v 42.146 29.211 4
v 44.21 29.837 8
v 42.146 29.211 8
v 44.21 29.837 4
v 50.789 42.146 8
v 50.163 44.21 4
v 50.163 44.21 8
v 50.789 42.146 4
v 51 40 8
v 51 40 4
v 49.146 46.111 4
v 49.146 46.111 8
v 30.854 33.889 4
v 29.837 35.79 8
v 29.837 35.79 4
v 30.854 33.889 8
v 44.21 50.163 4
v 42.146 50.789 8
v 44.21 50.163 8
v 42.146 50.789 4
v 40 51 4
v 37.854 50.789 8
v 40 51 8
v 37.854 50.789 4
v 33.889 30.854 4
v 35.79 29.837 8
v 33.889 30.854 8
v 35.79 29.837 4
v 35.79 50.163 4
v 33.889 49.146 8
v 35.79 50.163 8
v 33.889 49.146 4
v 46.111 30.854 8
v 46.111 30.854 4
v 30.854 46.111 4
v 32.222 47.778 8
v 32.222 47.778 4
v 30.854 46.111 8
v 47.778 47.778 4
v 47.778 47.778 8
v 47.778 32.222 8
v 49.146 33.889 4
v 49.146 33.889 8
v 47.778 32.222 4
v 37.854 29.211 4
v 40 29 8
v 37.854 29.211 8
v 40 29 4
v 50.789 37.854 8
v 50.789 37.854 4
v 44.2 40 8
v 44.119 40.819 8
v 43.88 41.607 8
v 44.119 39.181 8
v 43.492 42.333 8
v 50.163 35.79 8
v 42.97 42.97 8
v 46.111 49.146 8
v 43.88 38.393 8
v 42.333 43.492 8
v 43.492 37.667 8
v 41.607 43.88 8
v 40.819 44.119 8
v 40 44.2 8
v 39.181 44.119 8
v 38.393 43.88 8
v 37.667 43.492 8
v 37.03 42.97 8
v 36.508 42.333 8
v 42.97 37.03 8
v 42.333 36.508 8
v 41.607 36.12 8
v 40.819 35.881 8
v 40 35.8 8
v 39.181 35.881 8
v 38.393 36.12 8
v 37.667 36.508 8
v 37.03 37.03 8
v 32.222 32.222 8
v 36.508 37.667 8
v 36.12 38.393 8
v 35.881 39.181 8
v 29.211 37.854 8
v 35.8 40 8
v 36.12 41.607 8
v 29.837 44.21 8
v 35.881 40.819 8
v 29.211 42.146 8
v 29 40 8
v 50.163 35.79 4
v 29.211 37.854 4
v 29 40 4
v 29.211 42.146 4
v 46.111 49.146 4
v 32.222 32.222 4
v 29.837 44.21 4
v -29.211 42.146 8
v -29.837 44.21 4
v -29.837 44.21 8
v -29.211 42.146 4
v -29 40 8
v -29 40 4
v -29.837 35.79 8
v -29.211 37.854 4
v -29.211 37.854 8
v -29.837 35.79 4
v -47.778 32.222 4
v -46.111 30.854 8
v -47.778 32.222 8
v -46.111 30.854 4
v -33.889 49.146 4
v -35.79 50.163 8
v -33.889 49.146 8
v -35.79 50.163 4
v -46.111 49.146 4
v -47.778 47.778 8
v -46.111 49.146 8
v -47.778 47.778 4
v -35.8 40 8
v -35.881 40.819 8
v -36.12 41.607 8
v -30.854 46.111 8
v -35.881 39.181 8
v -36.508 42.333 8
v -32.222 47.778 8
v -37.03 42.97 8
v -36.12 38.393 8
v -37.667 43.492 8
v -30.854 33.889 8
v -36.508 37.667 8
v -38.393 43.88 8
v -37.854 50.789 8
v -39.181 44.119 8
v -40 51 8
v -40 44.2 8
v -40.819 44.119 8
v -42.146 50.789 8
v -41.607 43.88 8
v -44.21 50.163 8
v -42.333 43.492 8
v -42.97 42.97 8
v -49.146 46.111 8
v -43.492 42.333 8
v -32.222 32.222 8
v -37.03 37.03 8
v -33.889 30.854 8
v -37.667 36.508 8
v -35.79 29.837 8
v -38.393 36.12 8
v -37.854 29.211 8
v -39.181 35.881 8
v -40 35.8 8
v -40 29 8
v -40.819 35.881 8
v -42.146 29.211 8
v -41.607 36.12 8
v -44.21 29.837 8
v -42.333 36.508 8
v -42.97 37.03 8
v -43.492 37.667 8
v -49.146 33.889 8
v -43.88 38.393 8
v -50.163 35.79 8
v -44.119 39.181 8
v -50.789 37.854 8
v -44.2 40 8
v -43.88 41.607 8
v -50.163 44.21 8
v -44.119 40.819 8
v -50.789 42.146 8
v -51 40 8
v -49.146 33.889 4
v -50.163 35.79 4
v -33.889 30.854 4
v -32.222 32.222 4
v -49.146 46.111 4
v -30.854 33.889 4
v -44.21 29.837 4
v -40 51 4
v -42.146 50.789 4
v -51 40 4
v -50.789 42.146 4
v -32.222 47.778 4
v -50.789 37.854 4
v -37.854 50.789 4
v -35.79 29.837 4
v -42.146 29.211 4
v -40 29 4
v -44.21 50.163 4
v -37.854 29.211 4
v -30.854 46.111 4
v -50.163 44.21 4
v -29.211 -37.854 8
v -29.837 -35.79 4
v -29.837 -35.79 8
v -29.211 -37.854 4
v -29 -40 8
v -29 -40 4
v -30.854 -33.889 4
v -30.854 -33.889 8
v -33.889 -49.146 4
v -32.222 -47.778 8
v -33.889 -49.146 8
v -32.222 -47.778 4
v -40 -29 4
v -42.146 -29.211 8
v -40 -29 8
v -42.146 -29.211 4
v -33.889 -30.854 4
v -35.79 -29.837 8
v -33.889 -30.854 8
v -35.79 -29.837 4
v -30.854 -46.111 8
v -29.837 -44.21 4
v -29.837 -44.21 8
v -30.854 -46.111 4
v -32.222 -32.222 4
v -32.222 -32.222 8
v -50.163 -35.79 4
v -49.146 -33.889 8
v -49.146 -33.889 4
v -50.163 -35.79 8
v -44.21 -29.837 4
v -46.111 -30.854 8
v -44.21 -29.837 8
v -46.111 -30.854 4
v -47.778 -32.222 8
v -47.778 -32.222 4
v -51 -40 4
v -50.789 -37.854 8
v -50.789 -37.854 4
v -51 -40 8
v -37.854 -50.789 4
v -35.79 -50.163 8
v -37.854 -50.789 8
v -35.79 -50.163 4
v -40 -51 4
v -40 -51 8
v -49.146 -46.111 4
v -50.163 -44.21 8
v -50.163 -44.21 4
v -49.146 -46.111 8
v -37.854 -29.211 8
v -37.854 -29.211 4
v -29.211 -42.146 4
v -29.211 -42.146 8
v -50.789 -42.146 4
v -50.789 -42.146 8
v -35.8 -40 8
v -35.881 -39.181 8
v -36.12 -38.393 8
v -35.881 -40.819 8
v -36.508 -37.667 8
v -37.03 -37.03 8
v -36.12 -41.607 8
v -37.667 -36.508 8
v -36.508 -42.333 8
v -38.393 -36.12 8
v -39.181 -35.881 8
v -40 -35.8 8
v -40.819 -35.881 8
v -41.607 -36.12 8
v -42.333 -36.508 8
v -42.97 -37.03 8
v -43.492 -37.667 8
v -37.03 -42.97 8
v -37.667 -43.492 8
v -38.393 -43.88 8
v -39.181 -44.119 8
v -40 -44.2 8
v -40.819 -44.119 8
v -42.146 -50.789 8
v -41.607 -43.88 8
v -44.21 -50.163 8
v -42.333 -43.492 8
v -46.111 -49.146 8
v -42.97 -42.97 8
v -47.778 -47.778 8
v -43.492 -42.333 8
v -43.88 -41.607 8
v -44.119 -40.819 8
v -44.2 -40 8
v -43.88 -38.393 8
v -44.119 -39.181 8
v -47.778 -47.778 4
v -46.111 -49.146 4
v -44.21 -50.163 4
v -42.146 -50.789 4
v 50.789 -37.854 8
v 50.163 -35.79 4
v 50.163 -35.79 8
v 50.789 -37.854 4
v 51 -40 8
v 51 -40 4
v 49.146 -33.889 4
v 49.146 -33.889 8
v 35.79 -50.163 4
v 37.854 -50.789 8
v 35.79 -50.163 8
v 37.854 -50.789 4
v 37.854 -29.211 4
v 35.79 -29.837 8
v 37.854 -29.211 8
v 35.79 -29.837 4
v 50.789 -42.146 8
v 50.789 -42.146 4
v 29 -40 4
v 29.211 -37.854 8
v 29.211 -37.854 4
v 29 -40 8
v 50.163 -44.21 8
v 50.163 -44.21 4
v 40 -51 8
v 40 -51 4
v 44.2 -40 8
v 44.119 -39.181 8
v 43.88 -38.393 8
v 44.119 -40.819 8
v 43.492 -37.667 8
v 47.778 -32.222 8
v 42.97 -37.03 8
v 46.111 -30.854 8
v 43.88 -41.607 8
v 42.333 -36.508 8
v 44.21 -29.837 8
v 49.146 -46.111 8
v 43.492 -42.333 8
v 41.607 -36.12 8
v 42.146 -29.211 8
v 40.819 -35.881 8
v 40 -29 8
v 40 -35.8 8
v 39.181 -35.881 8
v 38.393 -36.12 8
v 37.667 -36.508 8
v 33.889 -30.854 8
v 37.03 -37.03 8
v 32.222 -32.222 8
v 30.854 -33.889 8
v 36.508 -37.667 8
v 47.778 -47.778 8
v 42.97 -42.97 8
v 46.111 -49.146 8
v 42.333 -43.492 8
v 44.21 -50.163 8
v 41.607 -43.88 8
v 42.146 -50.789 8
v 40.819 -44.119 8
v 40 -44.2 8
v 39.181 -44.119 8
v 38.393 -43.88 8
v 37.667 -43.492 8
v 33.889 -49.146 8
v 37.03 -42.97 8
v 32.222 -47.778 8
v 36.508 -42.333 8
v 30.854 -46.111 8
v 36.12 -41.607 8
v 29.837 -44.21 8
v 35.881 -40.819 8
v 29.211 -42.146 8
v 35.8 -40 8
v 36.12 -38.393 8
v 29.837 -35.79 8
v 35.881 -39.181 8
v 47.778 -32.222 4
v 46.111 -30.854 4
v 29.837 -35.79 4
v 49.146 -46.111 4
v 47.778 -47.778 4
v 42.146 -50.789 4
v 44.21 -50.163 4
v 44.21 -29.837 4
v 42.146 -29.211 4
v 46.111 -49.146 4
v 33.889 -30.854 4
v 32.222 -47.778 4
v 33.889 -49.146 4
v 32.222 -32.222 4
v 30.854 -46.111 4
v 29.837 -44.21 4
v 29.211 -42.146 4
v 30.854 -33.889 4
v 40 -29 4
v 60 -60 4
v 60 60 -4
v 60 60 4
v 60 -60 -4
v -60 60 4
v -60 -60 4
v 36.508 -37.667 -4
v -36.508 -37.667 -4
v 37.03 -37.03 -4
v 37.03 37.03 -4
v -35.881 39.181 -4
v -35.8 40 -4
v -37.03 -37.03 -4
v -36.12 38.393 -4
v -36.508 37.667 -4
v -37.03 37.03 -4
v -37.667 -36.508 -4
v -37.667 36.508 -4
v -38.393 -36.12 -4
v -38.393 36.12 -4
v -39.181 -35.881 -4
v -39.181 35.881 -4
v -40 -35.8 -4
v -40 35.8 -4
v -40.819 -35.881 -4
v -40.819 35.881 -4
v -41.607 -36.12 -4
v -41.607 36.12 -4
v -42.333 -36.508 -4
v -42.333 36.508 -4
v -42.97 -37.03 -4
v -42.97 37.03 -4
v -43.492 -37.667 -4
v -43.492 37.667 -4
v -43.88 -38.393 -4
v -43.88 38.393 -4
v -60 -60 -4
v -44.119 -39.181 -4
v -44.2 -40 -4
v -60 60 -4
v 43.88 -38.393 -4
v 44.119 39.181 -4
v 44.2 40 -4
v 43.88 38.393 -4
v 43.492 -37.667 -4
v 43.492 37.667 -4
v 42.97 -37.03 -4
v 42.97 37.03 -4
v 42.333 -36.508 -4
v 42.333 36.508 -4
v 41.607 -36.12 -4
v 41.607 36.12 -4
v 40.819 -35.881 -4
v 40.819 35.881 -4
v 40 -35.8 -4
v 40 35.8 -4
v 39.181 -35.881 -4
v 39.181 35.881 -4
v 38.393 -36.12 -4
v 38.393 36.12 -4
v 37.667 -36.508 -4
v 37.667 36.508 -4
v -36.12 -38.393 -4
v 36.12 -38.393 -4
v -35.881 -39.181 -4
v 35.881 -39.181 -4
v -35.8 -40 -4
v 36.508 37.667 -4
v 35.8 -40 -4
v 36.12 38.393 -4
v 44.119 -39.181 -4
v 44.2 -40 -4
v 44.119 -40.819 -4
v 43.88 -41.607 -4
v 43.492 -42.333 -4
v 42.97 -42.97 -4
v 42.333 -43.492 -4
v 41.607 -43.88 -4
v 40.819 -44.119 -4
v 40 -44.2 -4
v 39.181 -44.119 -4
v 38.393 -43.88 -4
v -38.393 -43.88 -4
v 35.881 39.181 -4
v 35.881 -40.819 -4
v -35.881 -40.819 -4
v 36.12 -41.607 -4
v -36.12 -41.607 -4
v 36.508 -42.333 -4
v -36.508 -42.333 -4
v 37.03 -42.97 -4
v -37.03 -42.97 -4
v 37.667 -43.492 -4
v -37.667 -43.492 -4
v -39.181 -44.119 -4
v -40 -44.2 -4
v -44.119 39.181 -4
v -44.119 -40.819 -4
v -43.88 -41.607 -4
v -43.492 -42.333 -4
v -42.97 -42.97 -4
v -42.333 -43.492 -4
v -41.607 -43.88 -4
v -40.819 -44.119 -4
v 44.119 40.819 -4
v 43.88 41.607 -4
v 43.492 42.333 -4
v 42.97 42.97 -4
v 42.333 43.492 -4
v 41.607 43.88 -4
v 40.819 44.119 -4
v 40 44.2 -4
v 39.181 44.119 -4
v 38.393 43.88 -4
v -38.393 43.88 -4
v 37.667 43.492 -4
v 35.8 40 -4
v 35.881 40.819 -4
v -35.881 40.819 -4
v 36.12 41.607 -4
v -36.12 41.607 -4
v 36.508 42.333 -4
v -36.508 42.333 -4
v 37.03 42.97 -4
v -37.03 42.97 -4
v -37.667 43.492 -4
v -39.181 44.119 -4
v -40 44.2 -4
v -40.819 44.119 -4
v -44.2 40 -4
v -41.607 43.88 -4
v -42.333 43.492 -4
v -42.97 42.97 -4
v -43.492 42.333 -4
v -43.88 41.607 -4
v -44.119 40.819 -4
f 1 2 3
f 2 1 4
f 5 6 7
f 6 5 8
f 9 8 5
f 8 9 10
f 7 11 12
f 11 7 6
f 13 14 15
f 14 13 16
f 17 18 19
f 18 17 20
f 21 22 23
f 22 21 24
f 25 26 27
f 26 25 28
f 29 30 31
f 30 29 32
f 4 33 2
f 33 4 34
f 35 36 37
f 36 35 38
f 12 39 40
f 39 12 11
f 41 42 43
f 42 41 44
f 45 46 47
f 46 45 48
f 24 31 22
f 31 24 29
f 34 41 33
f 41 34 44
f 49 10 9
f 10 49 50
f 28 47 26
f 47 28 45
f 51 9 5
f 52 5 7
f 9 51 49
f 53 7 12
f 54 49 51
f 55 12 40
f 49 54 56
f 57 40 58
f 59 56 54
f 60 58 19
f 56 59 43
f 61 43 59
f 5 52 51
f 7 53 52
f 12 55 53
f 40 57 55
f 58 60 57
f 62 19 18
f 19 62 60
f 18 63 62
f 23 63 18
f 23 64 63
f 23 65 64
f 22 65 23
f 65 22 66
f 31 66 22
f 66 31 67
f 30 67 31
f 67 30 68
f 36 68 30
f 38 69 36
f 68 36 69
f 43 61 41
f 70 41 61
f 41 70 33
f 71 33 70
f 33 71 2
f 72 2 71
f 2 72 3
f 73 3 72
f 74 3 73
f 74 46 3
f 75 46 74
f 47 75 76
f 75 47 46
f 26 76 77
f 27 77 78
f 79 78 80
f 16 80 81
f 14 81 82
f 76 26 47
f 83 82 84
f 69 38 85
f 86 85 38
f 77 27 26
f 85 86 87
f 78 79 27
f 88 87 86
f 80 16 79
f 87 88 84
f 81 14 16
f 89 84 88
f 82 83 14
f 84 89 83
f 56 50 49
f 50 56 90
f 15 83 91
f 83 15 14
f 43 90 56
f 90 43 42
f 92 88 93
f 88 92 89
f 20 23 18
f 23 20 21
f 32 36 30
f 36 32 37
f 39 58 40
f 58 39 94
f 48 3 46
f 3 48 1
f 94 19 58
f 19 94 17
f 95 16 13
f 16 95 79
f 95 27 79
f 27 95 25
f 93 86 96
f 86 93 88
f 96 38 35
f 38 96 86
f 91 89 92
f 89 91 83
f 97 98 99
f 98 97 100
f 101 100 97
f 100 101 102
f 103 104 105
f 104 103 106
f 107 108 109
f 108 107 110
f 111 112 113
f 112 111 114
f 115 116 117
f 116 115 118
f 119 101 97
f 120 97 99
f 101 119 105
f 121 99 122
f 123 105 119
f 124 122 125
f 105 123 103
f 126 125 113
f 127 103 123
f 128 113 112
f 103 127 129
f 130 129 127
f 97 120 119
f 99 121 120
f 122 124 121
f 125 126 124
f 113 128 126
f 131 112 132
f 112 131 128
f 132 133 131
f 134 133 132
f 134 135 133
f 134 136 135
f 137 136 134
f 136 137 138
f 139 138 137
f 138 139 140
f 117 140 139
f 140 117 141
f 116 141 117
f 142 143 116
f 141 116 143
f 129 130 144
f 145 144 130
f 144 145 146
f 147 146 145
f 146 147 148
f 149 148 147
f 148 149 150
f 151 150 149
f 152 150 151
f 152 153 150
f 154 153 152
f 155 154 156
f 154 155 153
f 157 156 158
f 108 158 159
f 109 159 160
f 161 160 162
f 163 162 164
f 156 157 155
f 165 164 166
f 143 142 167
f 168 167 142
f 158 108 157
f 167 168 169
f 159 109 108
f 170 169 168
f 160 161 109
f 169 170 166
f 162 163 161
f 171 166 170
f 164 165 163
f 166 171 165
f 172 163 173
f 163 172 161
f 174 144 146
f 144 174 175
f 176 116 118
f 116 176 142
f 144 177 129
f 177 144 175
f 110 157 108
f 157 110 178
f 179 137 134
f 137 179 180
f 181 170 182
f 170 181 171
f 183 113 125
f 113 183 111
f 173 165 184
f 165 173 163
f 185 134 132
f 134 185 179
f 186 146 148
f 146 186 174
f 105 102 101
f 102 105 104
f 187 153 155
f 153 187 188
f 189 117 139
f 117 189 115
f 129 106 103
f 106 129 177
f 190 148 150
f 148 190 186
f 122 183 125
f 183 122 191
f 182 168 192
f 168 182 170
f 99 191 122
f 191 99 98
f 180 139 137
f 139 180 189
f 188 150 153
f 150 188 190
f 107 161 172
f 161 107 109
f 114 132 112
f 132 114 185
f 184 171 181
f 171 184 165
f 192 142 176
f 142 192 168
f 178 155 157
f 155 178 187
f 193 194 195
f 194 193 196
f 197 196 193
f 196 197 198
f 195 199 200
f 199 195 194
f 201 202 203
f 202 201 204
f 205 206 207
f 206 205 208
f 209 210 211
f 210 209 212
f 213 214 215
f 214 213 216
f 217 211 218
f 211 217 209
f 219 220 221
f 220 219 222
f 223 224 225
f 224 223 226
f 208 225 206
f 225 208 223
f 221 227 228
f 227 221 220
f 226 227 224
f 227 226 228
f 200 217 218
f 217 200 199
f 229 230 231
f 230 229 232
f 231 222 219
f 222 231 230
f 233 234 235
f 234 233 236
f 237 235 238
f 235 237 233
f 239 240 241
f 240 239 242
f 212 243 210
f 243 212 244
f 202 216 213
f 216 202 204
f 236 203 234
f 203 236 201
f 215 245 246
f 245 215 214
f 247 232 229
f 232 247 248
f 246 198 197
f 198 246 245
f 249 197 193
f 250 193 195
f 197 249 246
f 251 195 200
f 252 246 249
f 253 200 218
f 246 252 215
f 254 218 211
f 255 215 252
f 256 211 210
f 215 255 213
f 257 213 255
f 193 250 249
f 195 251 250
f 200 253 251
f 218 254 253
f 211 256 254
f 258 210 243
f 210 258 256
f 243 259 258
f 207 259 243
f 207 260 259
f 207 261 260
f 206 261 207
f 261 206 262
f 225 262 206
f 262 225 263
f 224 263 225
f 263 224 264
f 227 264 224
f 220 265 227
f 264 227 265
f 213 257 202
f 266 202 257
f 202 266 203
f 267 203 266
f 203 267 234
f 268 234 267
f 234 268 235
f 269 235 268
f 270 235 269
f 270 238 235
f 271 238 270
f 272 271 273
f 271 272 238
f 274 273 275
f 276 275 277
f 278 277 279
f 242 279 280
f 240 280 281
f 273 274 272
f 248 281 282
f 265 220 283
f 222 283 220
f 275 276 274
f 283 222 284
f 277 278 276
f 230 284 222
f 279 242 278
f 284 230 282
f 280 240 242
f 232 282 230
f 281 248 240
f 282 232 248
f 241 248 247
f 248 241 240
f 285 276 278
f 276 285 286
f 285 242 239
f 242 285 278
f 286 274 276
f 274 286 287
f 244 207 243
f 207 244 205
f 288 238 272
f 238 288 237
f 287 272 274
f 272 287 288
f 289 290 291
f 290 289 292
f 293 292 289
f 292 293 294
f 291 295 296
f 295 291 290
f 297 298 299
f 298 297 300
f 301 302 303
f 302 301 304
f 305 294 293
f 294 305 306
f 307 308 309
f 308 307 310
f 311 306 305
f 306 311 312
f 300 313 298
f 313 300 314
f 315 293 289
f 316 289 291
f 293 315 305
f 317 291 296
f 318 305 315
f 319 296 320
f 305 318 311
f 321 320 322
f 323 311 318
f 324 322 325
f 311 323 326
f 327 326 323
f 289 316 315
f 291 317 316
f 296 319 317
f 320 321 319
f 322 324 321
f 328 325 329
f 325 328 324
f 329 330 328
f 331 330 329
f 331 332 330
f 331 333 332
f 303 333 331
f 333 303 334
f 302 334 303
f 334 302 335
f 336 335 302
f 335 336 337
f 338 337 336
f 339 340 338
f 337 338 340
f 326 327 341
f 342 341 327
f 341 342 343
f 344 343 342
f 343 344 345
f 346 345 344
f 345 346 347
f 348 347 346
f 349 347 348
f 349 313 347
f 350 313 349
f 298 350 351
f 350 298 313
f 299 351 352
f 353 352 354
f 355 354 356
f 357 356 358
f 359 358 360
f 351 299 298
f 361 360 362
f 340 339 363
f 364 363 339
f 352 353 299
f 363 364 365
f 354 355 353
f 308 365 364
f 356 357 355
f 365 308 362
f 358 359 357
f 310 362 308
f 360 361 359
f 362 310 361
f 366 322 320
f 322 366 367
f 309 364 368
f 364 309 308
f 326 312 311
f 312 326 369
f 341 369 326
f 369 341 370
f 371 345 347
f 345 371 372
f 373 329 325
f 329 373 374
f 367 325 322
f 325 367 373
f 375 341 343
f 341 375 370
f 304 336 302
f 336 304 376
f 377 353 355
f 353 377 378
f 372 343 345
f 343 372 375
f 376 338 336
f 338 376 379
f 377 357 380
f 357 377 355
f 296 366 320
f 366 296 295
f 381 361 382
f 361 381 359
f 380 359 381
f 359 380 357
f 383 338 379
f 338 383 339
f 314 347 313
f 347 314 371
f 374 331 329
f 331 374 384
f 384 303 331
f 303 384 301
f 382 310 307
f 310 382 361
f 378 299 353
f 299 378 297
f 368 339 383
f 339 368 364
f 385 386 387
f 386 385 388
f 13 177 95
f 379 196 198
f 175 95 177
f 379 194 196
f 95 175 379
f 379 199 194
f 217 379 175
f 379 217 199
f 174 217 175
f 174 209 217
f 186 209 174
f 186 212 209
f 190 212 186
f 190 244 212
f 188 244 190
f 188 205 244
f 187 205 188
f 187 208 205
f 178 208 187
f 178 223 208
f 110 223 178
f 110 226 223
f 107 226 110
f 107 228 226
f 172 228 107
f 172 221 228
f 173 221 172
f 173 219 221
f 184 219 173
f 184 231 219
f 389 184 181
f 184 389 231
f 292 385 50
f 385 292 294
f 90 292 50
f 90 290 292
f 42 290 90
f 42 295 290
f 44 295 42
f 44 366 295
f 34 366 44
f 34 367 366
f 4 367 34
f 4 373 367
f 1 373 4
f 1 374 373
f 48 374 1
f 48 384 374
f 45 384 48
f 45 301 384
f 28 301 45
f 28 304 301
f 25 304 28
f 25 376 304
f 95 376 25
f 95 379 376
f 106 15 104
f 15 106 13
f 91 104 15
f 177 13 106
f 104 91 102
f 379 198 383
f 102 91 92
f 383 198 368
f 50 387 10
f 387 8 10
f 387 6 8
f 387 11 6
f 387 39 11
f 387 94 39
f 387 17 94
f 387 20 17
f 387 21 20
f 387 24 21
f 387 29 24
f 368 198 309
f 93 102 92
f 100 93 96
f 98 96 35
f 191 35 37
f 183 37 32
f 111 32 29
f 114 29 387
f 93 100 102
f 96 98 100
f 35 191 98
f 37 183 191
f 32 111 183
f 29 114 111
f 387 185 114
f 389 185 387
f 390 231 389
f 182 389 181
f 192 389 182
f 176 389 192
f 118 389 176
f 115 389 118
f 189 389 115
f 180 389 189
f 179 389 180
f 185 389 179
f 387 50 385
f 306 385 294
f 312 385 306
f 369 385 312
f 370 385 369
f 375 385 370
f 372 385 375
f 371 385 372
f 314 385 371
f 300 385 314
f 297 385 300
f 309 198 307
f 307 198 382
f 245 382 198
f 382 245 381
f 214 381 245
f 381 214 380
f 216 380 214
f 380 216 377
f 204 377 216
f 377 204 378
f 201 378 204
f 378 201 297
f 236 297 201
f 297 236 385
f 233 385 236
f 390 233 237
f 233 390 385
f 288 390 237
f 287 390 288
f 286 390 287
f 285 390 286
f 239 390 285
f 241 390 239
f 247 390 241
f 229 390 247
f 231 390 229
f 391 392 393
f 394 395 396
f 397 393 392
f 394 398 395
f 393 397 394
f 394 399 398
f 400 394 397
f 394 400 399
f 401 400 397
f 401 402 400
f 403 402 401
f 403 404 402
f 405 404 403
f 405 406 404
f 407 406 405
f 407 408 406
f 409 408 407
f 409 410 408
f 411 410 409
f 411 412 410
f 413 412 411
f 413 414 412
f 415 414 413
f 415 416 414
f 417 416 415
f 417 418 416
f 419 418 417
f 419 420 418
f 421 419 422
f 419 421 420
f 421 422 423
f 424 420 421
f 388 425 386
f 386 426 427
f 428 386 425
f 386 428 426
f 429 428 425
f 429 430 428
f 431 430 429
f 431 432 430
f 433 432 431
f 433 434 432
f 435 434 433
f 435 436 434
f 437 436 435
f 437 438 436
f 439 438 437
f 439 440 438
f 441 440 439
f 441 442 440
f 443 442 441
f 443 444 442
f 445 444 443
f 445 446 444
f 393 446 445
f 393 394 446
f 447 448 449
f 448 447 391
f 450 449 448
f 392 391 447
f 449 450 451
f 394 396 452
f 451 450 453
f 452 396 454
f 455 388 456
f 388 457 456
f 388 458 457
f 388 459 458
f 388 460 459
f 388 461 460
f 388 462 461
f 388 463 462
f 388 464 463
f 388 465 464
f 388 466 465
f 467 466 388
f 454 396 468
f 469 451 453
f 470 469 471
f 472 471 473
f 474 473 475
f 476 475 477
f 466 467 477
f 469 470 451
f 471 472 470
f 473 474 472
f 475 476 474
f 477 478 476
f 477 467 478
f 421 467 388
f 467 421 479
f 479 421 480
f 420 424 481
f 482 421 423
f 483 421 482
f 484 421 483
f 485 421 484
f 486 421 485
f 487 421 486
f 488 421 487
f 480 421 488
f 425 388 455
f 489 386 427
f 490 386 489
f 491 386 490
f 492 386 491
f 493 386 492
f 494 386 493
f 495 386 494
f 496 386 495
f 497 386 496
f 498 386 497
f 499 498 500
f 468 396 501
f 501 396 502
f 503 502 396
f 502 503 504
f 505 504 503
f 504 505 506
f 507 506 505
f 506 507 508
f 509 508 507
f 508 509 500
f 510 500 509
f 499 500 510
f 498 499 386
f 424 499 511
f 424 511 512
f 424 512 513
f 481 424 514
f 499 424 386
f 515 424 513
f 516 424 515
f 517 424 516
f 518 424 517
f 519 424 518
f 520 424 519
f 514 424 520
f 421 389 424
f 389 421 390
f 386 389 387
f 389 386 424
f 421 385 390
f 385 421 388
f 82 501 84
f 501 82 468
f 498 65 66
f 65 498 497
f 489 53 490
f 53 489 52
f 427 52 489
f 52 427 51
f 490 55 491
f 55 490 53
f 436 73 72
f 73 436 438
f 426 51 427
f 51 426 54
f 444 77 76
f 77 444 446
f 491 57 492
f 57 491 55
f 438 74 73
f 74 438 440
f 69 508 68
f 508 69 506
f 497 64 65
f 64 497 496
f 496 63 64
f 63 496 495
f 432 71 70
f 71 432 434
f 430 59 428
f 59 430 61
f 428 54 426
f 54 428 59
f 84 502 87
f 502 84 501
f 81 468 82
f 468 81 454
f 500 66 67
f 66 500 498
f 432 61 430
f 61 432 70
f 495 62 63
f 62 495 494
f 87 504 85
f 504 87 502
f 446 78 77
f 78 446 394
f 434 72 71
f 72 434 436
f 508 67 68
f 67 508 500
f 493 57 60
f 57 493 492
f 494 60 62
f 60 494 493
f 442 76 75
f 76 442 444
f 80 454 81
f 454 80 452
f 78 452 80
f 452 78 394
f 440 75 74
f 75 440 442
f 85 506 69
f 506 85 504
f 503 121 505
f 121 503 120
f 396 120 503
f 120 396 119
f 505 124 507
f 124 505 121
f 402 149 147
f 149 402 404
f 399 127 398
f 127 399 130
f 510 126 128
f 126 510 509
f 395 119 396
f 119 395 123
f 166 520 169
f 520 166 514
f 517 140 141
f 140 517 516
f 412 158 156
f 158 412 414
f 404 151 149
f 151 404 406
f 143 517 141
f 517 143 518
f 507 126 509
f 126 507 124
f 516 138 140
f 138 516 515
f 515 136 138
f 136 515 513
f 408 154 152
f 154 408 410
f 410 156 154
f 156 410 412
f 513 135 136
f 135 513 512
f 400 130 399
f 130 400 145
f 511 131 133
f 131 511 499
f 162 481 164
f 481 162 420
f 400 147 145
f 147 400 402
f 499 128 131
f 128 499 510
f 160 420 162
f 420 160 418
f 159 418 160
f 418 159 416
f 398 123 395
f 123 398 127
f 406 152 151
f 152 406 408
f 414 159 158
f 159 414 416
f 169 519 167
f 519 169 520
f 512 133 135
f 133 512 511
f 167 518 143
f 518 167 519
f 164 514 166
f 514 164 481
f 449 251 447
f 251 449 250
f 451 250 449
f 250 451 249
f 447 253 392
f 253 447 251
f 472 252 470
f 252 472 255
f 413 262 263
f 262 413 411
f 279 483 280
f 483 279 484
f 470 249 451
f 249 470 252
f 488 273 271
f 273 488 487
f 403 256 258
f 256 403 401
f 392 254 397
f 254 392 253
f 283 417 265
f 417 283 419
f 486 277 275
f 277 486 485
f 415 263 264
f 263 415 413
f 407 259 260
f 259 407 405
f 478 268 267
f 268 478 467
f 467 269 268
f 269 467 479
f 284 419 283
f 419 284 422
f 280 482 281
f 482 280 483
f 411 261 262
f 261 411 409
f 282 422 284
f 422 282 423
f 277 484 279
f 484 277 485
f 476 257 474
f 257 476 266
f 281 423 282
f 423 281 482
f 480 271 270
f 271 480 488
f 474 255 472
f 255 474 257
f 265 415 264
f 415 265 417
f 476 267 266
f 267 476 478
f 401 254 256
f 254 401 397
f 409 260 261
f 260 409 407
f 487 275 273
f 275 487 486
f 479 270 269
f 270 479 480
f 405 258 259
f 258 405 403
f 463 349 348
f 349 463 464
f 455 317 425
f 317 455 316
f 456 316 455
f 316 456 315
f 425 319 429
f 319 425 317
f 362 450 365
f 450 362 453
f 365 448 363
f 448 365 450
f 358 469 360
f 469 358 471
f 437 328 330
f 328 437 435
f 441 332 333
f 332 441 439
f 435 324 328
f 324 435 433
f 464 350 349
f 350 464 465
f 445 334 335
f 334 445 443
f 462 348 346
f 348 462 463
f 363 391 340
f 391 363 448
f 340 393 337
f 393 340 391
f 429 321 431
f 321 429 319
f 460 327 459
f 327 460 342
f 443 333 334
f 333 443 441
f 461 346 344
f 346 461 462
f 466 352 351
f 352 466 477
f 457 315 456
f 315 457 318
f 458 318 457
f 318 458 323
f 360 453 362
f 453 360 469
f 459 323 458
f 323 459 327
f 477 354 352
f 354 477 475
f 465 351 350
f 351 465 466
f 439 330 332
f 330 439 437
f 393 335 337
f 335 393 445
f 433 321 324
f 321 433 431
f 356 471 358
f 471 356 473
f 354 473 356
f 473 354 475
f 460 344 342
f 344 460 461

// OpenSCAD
$fn = 32;

// ----------------------------------------------------------------------
// Anchor pads 120 x 120 x 12
// four corner bosses with anchor holes
// ----------------------------------------------------------------------

// --- parameters (mm) ---
plate = [120, 120, 8];  // base plate size (x, y, z)
pads = 4;               // boss count, one per corner
edge = 20;              // boss centre offset from the plate edge
boss_d = 22;            // boss diameter
boss_h = 4;             // boss height above the base plate
hole_d = 8.4;           // hole diameter

// --- derived feature positions (mm) ---
height = plate[2] + boss_h;      // = 12   overall height of the part
corner_x = plate[0] / 2 - edge;  // = 40   boss centre X
corner_y = plate[1] / 2 - edge;  // = 40   boss centre Y
feature_centers = [
  [corner_x, corner_y],
  [-corner_x, corner_y],
  [-corner_x, -corner_y],
  [corner_x, -corner_y]
];   // boss centres, anchor holes are drilled there

// base plate, four bosses standing on it, anchor holes all the way through
difference() {
  union() {
    cube(plate, center = true);
    for (centre = feature_centers)
      translate([centre[0], centre[1], plate[2] / 2 - 1])
        cylinder(d = boss_d, h = boss_h + 1);
  }
  for (centre = feature_centers)
    translate([centre[0], centre[1], -height])
      cylinder(d = hole_d, h = 2 * height + 2);  // through boss and plate
}
